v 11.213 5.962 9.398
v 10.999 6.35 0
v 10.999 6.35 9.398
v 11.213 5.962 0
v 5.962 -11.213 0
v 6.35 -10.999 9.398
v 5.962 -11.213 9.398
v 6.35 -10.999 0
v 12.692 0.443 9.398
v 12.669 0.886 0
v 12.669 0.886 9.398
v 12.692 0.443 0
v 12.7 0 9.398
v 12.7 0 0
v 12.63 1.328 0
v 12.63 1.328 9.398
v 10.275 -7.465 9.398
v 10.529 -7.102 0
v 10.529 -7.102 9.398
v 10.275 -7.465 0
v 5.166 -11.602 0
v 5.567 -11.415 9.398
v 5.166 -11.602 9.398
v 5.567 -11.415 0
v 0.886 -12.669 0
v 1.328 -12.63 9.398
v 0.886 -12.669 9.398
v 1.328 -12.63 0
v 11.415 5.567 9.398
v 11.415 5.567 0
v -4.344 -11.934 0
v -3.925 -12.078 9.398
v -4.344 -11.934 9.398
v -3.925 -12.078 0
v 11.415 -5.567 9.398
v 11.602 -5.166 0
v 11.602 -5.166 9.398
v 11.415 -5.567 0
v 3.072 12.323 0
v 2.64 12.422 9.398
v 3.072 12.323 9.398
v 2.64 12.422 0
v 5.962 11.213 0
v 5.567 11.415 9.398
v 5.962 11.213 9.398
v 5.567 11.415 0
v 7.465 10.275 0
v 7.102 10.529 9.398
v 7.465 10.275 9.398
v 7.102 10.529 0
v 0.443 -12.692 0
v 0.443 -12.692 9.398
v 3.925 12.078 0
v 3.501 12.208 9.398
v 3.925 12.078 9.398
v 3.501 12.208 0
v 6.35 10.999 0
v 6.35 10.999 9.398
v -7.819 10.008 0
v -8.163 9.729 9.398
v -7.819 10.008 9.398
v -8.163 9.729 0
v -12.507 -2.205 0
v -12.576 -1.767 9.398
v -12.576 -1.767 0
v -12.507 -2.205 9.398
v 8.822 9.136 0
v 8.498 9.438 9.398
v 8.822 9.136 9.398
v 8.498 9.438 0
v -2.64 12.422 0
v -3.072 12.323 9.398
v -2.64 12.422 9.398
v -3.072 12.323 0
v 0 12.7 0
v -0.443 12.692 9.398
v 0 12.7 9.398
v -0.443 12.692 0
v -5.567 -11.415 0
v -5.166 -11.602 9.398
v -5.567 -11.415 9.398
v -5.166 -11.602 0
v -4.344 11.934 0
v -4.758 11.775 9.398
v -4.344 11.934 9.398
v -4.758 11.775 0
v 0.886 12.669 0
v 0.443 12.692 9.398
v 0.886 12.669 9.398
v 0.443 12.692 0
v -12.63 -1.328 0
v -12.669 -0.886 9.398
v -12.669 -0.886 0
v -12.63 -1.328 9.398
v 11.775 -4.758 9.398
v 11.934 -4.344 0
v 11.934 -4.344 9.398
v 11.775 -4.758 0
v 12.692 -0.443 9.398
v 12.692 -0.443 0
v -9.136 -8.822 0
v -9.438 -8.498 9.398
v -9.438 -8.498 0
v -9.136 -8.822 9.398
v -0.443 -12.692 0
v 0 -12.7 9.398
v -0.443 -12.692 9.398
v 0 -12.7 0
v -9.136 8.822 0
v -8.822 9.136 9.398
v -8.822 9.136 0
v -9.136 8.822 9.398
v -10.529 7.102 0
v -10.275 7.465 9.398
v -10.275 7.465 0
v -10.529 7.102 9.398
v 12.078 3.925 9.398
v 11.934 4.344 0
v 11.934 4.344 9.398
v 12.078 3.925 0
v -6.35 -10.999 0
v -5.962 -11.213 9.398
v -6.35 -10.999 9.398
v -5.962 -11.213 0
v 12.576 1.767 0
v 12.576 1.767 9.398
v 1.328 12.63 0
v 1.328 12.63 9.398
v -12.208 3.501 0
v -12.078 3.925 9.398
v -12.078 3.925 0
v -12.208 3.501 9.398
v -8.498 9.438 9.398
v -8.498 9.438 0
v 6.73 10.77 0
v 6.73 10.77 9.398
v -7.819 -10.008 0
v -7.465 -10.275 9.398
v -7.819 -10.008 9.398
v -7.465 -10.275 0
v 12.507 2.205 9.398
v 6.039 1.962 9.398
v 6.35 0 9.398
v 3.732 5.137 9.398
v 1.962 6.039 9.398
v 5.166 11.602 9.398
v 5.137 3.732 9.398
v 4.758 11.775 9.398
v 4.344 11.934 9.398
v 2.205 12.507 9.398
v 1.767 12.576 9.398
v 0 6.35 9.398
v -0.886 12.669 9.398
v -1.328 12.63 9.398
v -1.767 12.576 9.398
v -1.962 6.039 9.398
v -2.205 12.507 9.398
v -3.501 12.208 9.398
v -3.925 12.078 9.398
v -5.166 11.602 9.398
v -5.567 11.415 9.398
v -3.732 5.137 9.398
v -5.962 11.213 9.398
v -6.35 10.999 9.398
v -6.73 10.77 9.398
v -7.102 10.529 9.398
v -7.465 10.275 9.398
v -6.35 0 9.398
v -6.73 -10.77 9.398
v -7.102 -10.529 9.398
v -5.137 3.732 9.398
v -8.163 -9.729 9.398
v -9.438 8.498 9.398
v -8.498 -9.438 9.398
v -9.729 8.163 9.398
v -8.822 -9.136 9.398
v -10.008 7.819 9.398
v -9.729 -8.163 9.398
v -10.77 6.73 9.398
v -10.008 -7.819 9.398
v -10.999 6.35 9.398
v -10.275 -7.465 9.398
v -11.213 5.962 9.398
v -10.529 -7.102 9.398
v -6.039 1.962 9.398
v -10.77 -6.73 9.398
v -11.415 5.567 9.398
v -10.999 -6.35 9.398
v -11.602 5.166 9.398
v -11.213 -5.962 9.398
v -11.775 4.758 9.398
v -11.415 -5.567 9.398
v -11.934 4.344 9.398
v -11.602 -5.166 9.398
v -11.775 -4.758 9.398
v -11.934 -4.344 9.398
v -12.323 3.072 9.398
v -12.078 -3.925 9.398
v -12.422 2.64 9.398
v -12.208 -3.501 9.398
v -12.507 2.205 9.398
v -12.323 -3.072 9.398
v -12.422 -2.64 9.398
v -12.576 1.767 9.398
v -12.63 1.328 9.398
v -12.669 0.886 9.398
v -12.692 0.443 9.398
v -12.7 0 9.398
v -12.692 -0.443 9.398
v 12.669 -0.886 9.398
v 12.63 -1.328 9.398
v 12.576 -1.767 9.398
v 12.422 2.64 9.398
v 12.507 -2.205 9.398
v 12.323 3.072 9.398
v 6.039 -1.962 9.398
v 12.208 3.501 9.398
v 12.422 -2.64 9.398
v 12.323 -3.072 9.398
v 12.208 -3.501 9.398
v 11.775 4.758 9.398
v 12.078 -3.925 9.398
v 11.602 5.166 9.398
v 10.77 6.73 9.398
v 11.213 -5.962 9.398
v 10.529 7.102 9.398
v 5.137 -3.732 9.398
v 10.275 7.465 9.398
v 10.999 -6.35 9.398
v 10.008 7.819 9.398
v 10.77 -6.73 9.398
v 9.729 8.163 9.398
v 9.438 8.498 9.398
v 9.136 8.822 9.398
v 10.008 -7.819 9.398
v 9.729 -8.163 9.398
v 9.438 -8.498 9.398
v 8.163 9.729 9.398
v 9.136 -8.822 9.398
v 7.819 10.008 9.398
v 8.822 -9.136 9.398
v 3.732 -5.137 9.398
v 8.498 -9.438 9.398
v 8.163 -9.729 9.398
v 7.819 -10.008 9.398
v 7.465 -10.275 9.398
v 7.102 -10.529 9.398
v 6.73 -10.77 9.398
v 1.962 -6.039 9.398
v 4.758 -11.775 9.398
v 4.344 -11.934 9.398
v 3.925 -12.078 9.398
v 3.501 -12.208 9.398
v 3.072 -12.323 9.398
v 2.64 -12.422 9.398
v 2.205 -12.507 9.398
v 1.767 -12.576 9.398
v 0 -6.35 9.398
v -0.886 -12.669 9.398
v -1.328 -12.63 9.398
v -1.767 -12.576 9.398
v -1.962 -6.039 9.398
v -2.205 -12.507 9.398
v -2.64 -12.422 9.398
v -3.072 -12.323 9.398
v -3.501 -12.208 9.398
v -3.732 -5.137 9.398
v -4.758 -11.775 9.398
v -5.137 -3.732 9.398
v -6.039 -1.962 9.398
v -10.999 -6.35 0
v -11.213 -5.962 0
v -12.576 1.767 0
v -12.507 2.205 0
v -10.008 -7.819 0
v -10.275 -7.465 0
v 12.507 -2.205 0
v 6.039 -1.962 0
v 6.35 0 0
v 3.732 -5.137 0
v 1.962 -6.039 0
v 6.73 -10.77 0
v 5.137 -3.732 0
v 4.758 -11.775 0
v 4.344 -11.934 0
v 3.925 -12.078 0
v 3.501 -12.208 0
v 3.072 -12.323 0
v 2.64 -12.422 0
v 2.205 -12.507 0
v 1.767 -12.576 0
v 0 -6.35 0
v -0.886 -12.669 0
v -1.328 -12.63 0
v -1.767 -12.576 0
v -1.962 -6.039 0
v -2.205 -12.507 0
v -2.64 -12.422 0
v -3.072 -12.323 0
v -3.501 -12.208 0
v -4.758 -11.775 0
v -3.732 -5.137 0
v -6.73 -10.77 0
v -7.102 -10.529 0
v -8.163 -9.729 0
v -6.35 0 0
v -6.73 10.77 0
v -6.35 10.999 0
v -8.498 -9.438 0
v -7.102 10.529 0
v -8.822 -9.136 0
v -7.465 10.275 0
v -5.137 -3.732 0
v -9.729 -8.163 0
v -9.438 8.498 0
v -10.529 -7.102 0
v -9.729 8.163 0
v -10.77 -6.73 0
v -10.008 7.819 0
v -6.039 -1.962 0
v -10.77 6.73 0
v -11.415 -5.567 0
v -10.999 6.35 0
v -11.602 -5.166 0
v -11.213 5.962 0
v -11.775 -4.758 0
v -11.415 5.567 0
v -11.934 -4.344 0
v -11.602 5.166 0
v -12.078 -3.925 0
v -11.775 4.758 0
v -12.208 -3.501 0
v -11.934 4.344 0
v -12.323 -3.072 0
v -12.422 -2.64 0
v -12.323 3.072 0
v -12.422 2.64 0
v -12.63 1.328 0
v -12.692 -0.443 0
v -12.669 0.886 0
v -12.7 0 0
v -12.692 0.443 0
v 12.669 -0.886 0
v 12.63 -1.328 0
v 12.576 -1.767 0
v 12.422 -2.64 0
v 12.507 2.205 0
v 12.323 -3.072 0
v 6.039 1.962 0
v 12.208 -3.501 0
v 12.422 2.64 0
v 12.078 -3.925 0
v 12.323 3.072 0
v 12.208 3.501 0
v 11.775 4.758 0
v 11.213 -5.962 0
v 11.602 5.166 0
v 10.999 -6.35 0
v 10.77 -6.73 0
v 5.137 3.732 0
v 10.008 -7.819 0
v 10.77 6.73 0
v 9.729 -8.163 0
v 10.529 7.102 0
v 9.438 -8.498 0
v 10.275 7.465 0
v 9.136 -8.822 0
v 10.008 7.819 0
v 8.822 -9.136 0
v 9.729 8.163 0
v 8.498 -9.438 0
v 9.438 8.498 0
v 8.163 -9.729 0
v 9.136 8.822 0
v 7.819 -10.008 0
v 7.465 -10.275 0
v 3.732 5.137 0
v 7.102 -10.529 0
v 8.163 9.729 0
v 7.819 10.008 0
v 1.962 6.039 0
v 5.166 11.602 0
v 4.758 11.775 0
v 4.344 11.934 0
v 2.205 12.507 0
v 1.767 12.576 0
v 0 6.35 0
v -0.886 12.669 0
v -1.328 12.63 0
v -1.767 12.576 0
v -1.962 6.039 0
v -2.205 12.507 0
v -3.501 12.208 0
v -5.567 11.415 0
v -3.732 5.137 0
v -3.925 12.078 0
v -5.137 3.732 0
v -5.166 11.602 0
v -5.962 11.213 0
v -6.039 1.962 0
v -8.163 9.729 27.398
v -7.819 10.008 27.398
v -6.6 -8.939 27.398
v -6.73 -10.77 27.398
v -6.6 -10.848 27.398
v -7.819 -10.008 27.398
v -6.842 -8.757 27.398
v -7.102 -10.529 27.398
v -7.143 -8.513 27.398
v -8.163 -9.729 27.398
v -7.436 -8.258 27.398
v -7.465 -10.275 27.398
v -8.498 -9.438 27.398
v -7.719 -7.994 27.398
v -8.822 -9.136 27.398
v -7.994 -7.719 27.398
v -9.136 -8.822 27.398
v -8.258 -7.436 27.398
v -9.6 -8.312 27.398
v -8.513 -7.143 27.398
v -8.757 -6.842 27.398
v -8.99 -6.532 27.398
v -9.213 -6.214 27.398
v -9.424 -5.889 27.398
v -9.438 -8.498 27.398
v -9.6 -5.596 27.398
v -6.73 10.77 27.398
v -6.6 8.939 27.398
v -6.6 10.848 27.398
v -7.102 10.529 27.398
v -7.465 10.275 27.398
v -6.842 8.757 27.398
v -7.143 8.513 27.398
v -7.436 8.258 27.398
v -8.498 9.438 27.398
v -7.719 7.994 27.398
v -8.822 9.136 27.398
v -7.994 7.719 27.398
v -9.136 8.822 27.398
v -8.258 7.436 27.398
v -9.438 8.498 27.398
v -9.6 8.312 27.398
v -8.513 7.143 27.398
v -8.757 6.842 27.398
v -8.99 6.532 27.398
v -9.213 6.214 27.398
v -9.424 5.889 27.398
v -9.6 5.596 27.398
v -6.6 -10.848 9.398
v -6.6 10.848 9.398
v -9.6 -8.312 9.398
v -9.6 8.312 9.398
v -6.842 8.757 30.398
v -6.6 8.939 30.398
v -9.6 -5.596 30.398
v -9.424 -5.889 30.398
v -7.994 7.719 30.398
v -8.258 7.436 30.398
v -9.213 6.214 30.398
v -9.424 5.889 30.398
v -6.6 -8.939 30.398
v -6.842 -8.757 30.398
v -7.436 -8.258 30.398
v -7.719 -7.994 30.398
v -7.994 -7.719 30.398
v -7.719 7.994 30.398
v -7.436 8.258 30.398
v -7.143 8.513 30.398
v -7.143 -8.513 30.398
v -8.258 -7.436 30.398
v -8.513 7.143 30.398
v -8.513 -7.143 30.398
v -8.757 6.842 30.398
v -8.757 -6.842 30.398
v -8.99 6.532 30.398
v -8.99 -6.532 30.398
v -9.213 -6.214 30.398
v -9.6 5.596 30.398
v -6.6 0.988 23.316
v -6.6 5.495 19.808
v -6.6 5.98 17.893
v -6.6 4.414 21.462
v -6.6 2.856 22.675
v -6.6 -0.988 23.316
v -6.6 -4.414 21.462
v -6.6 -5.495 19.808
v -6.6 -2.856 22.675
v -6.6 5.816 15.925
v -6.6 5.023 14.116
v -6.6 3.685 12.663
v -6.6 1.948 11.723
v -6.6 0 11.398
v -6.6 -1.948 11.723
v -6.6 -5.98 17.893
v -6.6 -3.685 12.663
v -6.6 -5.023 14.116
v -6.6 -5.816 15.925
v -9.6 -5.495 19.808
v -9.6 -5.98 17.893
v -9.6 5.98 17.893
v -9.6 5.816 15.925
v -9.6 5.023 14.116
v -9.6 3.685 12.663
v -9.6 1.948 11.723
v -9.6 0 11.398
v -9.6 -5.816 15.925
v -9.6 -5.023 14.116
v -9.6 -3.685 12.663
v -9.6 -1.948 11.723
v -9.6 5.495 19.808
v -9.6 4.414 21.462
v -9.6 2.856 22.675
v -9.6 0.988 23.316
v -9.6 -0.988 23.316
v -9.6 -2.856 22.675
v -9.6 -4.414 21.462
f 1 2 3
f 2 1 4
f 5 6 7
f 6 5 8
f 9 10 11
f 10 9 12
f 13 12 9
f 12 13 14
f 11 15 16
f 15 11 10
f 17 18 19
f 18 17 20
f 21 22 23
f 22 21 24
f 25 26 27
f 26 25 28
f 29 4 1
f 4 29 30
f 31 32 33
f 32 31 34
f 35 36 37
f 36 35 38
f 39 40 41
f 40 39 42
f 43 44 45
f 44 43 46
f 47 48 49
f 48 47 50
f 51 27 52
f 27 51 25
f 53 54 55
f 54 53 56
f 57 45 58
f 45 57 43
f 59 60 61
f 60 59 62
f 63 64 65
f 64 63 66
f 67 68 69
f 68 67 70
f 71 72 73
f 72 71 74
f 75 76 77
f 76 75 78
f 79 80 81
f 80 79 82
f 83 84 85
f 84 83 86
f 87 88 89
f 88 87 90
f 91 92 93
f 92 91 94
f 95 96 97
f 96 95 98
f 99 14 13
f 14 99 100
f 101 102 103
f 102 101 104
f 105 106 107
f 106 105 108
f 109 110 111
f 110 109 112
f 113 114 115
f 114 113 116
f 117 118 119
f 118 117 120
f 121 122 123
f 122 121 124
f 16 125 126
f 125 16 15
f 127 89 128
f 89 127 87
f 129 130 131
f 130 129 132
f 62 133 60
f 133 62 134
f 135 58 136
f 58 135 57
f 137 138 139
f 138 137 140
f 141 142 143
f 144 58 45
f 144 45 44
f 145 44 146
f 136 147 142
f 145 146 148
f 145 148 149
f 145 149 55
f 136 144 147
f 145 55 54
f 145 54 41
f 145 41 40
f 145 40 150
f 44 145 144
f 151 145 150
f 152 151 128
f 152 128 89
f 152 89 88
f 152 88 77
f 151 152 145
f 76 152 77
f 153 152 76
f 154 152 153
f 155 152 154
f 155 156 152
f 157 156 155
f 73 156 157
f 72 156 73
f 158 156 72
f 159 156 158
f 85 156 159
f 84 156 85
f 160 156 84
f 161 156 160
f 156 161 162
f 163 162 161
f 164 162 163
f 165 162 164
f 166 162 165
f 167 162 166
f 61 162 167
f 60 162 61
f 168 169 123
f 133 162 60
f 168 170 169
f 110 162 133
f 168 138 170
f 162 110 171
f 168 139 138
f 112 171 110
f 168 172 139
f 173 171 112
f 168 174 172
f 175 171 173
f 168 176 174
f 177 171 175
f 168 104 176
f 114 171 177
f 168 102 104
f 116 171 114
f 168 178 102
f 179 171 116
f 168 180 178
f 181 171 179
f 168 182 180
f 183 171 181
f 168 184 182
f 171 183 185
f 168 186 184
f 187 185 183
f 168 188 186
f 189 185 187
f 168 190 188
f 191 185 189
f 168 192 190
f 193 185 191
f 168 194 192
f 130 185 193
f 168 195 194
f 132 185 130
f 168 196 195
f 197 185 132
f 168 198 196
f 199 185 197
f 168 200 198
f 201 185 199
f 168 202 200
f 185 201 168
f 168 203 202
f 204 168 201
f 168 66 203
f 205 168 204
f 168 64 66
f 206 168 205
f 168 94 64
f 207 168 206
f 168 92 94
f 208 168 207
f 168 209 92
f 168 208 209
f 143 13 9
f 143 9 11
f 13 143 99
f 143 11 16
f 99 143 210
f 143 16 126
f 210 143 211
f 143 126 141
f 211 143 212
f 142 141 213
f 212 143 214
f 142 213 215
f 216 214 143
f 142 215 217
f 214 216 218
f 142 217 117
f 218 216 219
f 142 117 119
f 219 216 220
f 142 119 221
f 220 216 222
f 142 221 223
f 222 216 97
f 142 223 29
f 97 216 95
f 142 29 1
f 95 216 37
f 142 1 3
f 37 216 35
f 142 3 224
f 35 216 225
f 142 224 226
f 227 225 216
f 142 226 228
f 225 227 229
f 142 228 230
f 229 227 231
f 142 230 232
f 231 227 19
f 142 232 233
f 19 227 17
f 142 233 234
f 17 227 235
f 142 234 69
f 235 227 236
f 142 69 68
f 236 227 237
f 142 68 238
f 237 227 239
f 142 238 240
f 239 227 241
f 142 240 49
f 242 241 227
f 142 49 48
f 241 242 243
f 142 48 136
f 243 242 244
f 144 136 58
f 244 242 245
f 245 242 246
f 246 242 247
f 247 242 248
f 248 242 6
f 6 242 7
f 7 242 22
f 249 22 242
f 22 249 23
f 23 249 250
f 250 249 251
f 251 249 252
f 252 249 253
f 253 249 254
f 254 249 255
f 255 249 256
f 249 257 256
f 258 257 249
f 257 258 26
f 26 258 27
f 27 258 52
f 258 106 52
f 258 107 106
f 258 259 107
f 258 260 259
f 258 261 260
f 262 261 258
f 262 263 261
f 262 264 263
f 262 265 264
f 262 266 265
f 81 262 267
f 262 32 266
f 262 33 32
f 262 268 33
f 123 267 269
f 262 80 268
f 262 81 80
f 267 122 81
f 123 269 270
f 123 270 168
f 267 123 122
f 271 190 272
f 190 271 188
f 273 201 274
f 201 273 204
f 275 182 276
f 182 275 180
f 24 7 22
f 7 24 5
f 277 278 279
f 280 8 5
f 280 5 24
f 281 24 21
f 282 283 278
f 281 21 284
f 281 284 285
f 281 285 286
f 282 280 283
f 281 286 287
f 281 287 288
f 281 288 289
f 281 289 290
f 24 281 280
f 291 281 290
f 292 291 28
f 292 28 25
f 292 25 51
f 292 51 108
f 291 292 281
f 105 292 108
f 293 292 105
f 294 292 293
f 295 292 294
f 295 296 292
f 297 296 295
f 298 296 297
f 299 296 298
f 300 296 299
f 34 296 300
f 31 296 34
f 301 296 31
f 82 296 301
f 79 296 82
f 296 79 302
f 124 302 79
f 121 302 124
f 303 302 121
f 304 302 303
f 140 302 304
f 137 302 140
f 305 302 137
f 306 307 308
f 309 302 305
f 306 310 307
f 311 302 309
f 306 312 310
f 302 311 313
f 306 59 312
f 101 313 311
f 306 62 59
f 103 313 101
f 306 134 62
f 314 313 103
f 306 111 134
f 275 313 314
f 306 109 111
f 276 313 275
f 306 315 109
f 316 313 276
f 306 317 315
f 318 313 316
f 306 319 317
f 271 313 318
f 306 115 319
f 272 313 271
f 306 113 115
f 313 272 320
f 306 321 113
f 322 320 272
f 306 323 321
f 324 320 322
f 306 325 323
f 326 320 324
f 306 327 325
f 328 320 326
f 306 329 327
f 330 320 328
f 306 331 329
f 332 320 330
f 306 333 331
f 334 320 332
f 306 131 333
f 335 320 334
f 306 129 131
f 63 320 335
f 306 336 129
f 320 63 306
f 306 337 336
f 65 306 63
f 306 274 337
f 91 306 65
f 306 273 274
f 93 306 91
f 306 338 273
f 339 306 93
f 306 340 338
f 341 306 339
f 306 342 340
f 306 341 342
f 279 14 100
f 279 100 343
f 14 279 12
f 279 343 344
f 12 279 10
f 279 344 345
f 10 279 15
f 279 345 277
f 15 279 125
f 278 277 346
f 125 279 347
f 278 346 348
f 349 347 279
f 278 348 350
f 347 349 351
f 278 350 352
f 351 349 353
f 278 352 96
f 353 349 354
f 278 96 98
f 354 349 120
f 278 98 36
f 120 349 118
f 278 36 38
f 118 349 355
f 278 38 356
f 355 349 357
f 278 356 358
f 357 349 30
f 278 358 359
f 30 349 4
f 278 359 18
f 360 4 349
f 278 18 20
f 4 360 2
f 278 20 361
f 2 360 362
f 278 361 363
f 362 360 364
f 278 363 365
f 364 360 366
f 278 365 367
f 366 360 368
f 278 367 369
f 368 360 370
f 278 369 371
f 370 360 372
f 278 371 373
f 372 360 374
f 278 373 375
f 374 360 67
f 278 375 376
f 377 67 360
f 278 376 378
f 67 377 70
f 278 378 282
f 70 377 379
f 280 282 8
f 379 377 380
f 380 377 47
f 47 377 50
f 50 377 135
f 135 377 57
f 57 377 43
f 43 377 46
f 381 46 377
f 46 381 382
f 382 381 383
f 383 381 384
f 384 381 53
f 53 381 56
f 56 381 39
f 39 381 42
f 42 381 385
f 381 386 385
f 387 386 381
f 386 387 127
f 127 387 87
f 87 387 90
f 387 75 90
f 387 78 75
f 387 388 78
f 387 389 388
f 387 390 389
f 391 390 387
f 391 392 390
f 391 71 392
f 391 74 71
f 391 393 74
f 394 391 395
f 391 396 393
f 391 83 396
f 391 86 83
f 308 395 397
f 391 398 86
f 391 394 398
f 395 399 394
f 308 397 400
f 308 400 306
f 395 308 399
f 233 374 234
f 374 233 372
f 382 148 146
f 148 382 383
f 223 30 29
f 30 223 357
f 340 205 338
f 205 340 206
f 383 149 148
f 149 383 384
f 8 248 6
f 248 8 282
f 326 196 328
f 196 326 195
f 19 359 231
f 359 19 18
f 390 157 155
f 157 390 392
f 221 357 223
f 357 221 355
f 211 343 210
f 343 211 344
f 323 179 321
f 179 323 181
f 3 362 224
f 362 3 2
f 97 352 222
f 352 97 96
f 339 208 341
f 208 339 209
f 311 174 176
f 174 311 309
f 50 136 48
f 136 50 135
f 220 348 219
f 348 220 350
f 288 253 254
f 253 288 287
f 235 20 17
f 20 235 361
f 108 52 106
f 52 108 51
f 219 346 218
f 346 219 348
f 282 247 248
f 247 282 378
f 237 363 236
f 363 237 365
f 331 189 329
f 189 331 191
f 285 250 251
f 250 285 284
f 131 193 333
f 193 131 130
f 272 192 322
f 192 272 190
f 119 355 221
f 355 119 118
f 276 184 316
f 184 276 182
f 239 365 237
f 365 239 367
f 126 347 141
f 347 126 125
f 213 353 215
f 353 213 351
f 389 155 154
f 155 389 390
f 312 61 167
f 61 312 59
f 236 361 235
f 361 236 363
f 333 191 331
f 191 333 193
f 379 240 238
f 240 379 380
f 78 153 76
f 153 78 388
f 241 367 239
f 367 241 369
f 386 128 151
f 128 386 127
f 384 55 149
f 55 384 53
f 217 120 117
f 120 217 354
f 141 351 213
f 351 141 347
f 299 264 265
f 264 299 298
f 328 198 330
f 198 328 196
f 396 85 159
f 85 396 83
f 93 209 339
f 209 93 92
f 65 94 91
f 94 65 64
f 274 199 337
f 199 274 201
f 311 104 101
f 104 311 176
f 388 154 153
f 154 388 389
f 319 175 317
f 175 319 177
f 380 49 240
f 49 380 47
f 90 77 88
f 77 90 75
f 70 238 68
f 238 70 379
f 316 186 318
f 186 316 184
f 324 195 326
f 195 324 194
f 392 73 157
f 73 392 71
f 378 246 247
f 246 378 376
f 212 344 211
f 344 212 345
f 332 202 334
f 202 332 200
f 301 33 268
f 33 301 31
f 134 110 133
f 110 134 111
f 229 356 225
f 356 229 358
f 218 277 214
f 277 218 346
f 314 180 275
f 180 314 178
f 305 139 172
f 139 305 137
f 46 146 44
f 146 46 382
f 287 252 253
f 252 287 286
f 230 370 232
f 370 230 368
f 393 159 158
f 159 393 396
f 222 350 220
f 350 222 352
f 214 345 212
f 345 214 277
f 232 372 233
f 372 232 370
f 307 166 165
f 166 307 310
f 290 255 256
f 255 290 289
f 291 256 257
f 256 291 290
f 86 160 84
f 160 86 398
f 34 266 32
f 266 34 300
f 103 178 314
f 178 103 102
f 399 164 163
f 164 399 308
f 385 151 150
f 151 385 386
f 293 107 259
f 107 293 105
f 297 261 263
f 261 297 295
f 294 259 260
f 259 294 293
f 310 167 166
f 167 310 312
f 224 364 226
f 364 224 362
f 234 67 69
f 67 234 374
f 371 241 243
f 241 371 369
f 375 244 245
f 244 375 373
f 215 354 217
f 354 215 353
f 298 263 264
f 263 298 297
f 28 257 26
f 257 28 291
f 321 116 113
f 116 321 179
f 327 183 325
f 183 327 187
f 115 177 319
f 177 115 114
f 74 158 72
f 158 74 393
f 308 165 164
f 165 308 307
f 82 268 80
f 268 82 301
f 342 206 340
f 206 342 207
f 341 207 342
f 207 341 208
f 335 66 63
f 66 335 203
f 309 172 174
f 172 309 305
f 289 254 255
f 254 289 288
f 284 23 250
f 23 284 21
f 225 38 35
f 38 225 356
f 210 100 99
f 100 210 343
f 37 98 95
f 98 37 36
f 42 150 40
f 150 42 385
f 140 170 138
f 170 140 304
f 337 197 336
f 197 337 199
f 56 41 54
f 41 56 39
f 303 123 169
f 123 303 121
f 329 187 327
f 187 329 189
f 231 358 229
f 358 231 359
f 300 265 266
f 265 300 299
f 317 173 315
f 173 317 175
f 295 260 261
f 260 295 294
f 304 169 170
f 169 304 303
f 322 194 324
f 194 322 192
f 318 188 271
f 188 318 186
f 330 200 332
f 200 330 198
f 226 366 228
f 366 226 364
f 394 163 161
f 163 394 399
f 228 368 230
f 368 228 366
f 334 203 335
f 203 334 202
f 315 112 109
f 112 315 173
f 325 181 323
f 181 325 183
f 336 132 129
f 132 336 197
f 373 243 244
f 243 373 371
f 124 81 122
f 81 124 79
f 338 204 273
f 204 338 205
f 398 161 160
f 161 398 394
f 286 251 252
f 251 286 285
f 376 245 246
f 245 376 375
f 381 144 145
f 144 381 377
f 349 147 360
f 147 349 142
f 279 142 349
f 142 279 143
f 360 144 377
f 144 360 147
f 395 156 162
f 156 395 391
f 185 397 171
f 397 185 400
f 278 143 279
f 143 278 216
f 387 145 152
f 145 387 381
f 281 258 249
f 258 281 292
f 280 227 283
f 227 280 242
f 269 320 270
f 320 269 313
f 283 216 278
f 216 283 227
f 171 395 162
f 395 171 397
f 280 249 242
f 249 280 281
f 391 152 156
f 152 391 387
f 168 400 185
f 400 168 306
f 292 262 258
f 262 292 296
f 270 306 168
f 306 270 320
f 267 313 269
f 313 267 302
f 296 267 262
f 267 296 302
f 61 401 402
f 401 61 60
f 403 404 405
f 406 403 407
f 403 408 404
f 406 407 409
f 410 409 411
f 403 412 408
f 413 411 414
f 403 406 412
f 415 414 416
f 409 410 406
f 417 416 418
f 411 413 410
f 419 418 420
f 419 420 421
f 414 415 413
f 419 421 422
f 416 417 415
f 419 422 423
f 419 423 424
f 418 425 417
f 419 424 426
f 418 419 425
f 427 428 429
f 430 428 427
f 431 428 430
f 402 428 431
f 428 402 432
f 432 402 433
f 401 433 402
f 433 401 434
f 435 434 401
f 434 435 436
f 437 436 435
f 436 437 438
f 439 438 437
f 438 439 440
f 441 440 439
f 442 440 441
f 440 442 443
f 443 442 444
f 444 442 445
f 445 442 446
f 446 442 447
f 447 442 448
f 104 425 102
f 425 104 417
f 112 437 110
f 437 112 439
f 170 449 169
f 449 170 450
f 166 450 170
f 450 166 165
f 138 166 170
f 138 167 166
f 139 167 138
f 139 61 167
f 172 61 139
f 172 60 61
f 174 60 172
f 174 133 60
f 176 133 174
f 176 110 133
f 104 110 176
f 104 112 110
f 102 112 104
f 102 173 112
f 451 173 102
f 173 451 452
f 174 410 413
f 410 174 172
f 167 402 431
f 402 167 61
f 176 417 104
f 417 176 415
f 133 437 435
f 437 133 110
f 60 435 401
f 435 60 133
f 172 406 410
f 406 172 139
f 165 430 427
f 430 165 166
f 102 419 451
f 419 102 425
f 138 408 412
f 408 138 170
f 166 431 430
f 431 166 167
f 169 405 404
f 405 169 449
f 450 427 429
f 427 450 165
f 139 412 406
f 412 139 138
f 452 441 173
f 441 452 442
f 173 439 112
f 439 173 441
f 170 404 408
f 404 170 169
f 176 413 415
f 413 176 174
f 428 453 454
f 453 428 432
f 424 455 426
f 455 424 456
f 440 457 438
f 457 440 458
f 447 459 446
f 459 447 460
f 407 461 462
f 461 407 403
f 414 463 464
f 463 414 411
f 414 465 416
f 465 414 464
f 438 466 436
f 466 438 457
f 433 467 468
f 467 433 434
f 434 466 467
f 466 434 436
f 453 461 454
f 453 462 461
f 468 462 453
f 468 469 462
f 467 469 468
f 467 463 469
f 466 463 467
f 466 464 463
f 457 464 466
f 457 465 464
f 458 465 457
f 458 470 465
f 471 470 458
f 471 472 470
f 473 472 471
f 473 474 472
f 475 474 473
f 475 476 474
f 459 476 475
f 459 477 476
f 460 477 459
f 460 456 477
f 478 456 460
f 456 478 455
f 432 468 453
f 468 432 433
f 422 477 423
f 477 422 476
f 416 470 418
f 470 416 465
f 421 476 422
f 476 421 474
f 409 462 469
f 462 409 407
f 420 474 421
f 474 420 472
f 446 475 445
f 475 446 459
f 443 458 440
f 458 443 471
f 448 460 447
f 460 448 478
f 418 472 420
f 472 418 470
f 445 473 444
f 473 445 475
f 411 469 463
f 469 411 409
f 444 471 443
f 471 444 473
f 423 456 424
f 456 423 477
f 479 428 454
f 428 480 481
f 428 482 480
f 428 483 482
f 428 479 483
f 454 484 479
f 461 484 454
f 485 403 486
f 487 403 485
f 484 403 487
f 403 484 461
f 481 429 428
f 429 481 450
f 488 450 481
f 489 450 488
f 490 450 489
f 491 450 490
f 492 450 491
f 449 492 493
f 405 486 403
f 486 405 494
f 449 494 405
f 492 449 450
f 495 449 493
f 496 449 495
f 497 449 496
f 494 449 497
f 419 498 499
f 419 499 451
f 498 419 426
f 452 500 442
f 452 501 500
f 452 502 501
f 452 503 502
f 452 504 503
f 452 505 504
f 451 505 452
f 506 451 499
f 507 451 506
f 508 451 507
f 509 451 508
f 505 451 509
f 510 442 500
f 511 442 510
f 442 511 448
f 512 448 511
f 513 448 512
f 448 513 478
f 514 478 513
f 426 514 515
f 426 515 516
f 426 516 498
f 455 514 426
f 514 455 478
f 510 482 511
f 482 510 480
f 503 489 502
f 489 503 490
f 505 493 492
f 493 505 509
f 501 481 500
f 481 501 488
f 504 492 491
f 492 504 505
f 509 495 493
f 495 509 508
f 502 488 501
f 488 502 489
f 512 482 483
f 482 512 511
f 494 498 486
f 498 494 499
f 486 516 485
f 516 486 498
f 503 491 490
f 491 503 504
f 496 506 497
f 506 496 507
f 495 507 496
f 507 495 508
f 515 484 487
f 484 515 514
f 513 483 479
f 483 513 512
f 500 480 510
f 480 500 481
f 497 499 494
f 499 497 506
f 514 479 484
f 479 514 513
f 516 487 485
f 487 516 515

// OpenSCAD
// file: dim.scad
MM_TO_INCHES = 1 / 25.4;
INCHES_TO_MM = 25.4;

D_FORWARD			= 1.00 * INCHES_TO_MM;
D_AFT				= 31.4;
R_FORWARD 			= D_FORWARD / 2;
R_AFT 				= D_AFT / 2;
D_SABER_OUTER		= 37.5;

D_PORT_SCREW		= 0.5 * INCHES_TO_MM;
R_PORT_SCREW 		= D_PORT_SCREW / 2;

FACES 				= 90;
GAP					= 0.200;
// file: ../shapes.scad
FACES = 180;
EPSILON = 0.1;

module tube(p_h, rOuter, rInner) {
	difference() {
		cylinder(h=p_h, r=rOuter, $fn=FACES);
		translate([0,0,-EPSILON]) {
			cylinder(h=p_h + EPSILON*2, r=rInner, $fn=FACES);
		}
	}
}

module shelf(_r0, _h, _r1) {
	rotate_extrude($fn=FACES) {
		polygon([[_r0, 0], [_r1, _h], [_r0, _h]]);
	}
}

/*
needs a 2016 version.	
module tubeArc(deg, p_h, rOuter, rInner) {
	//rotate([90,0,0]) {
		rotate_extrude(angle=30) {
			translate([rInner,0,0]) {
				square(size=[rOuter-rInner, p_h], center=false);
			}
		}
	//}
}
*/
// main file
use <../threads.scad>
use <../shapes.scad>
include <dim.scad>

INCHES_TO_MM = 25.4;
MM_TO_INCHES = 1 / 25.4;
FACES = 180;

H_HEAT_SINK_THREAD = 0.37 * INCHES_TO_MM;
H_VOL			   = 18;

RENDER_THREADS = false;

// LED / button positive (above axis)
// thread negative (below axis)
//
module switch(drawThread)
{
	D_OUTER_TOP = 13.8;
	D_INNER_TOP = 11.0;
	H_TOP       =  1.5;
	H_BODY		= 13;	// approx. connections below.

	color("green") {
		cylinder(h = H_TOP, r1 = D_OUTER_TOP / 2, r2 = D_INNER_TOP / 2);
		translate([0, 0, -H_BODY]) {
			if (drawThread) {
				metric_thread(diameter=12.0, length=H_BODY, pitch=0.75);
			}
			else {
				cylinder(h = H_BODY, r = 6.0);
			}
		}
	}
}

module emitterVolume()
{
	translate([0, 0, H_HEAT_SINK_THREAD]) {
		cylinder(h=H_VOL, r = INCHES_TO_MM / 2, $fn = FACES);
		translate([0, 0, H_VOL]) {
			cylinder(h=3, r = (1 - 1/8) * INCHES_TO_MM / 2, $fn = FACES);
		}
	}
}


*switch(false);

// LED holder
difference() {
	cylinder(h=H_HEAT_SINK_THREAD, r = INCHES_TO_MM / 2, $fn=FACES);
	if (RENDER_THREADS) {
		english_thread(diameter=0.5, length=H_HEAT_SINK_THREAD * MM_TO_INCHES, threads_per_inch=14, internal=true);
	}
	else {
		cylinder(h=H_HEAT_SINK_THREAD, r = 0.5 * INCHES_TO_MM / 2);
	}
	
}

X_SWITCH = 9.6;
Z_SWITCH = 8;

// Switch holder
/*
translate([-X_SWITCH,0,18])
{
	rotate([0, -90, 0]) {
   		
        translate([0, 0, 0]) {
			switch(false);
		}
        difference() 
		{
			cylinder(r=15/2, h=Z_SWITCH);
			cylinder(r=12/2, h=Z_SWITCH);
		}
	}
}
*/

// Switch holder v2
T_HOLDER = 3;
difference() 
{
    intersection() 
    {
        emitterVolume();
        translate([-X_SWITCH, -20, H_HEAT_SINK_THREAD]) {
            cube([T_HOLDER, 40, 40]);
        }
    }    
    translate([-X_SWITCH, 0, H_HEAT_SINK_THREAD + Z_SWITCH]) {
        rotate([0, 90, 0]) {
            if (RENDER_THREADS) {
                metric_thread(diameter=12.0, length=T_HOLDER + 0.1, pitch=0.75, inner=true);
            }
            else {
                cylinder(r=6, h=T_HOLDER + 0.1);
            }
        }
    }
}

*translate([-X_SWITCH, 0, H_HEAT_SINK_THREAD + Z_SWITCH]) {
    rotate([0, -90, 0]) {
        switch(false);
    }
}
